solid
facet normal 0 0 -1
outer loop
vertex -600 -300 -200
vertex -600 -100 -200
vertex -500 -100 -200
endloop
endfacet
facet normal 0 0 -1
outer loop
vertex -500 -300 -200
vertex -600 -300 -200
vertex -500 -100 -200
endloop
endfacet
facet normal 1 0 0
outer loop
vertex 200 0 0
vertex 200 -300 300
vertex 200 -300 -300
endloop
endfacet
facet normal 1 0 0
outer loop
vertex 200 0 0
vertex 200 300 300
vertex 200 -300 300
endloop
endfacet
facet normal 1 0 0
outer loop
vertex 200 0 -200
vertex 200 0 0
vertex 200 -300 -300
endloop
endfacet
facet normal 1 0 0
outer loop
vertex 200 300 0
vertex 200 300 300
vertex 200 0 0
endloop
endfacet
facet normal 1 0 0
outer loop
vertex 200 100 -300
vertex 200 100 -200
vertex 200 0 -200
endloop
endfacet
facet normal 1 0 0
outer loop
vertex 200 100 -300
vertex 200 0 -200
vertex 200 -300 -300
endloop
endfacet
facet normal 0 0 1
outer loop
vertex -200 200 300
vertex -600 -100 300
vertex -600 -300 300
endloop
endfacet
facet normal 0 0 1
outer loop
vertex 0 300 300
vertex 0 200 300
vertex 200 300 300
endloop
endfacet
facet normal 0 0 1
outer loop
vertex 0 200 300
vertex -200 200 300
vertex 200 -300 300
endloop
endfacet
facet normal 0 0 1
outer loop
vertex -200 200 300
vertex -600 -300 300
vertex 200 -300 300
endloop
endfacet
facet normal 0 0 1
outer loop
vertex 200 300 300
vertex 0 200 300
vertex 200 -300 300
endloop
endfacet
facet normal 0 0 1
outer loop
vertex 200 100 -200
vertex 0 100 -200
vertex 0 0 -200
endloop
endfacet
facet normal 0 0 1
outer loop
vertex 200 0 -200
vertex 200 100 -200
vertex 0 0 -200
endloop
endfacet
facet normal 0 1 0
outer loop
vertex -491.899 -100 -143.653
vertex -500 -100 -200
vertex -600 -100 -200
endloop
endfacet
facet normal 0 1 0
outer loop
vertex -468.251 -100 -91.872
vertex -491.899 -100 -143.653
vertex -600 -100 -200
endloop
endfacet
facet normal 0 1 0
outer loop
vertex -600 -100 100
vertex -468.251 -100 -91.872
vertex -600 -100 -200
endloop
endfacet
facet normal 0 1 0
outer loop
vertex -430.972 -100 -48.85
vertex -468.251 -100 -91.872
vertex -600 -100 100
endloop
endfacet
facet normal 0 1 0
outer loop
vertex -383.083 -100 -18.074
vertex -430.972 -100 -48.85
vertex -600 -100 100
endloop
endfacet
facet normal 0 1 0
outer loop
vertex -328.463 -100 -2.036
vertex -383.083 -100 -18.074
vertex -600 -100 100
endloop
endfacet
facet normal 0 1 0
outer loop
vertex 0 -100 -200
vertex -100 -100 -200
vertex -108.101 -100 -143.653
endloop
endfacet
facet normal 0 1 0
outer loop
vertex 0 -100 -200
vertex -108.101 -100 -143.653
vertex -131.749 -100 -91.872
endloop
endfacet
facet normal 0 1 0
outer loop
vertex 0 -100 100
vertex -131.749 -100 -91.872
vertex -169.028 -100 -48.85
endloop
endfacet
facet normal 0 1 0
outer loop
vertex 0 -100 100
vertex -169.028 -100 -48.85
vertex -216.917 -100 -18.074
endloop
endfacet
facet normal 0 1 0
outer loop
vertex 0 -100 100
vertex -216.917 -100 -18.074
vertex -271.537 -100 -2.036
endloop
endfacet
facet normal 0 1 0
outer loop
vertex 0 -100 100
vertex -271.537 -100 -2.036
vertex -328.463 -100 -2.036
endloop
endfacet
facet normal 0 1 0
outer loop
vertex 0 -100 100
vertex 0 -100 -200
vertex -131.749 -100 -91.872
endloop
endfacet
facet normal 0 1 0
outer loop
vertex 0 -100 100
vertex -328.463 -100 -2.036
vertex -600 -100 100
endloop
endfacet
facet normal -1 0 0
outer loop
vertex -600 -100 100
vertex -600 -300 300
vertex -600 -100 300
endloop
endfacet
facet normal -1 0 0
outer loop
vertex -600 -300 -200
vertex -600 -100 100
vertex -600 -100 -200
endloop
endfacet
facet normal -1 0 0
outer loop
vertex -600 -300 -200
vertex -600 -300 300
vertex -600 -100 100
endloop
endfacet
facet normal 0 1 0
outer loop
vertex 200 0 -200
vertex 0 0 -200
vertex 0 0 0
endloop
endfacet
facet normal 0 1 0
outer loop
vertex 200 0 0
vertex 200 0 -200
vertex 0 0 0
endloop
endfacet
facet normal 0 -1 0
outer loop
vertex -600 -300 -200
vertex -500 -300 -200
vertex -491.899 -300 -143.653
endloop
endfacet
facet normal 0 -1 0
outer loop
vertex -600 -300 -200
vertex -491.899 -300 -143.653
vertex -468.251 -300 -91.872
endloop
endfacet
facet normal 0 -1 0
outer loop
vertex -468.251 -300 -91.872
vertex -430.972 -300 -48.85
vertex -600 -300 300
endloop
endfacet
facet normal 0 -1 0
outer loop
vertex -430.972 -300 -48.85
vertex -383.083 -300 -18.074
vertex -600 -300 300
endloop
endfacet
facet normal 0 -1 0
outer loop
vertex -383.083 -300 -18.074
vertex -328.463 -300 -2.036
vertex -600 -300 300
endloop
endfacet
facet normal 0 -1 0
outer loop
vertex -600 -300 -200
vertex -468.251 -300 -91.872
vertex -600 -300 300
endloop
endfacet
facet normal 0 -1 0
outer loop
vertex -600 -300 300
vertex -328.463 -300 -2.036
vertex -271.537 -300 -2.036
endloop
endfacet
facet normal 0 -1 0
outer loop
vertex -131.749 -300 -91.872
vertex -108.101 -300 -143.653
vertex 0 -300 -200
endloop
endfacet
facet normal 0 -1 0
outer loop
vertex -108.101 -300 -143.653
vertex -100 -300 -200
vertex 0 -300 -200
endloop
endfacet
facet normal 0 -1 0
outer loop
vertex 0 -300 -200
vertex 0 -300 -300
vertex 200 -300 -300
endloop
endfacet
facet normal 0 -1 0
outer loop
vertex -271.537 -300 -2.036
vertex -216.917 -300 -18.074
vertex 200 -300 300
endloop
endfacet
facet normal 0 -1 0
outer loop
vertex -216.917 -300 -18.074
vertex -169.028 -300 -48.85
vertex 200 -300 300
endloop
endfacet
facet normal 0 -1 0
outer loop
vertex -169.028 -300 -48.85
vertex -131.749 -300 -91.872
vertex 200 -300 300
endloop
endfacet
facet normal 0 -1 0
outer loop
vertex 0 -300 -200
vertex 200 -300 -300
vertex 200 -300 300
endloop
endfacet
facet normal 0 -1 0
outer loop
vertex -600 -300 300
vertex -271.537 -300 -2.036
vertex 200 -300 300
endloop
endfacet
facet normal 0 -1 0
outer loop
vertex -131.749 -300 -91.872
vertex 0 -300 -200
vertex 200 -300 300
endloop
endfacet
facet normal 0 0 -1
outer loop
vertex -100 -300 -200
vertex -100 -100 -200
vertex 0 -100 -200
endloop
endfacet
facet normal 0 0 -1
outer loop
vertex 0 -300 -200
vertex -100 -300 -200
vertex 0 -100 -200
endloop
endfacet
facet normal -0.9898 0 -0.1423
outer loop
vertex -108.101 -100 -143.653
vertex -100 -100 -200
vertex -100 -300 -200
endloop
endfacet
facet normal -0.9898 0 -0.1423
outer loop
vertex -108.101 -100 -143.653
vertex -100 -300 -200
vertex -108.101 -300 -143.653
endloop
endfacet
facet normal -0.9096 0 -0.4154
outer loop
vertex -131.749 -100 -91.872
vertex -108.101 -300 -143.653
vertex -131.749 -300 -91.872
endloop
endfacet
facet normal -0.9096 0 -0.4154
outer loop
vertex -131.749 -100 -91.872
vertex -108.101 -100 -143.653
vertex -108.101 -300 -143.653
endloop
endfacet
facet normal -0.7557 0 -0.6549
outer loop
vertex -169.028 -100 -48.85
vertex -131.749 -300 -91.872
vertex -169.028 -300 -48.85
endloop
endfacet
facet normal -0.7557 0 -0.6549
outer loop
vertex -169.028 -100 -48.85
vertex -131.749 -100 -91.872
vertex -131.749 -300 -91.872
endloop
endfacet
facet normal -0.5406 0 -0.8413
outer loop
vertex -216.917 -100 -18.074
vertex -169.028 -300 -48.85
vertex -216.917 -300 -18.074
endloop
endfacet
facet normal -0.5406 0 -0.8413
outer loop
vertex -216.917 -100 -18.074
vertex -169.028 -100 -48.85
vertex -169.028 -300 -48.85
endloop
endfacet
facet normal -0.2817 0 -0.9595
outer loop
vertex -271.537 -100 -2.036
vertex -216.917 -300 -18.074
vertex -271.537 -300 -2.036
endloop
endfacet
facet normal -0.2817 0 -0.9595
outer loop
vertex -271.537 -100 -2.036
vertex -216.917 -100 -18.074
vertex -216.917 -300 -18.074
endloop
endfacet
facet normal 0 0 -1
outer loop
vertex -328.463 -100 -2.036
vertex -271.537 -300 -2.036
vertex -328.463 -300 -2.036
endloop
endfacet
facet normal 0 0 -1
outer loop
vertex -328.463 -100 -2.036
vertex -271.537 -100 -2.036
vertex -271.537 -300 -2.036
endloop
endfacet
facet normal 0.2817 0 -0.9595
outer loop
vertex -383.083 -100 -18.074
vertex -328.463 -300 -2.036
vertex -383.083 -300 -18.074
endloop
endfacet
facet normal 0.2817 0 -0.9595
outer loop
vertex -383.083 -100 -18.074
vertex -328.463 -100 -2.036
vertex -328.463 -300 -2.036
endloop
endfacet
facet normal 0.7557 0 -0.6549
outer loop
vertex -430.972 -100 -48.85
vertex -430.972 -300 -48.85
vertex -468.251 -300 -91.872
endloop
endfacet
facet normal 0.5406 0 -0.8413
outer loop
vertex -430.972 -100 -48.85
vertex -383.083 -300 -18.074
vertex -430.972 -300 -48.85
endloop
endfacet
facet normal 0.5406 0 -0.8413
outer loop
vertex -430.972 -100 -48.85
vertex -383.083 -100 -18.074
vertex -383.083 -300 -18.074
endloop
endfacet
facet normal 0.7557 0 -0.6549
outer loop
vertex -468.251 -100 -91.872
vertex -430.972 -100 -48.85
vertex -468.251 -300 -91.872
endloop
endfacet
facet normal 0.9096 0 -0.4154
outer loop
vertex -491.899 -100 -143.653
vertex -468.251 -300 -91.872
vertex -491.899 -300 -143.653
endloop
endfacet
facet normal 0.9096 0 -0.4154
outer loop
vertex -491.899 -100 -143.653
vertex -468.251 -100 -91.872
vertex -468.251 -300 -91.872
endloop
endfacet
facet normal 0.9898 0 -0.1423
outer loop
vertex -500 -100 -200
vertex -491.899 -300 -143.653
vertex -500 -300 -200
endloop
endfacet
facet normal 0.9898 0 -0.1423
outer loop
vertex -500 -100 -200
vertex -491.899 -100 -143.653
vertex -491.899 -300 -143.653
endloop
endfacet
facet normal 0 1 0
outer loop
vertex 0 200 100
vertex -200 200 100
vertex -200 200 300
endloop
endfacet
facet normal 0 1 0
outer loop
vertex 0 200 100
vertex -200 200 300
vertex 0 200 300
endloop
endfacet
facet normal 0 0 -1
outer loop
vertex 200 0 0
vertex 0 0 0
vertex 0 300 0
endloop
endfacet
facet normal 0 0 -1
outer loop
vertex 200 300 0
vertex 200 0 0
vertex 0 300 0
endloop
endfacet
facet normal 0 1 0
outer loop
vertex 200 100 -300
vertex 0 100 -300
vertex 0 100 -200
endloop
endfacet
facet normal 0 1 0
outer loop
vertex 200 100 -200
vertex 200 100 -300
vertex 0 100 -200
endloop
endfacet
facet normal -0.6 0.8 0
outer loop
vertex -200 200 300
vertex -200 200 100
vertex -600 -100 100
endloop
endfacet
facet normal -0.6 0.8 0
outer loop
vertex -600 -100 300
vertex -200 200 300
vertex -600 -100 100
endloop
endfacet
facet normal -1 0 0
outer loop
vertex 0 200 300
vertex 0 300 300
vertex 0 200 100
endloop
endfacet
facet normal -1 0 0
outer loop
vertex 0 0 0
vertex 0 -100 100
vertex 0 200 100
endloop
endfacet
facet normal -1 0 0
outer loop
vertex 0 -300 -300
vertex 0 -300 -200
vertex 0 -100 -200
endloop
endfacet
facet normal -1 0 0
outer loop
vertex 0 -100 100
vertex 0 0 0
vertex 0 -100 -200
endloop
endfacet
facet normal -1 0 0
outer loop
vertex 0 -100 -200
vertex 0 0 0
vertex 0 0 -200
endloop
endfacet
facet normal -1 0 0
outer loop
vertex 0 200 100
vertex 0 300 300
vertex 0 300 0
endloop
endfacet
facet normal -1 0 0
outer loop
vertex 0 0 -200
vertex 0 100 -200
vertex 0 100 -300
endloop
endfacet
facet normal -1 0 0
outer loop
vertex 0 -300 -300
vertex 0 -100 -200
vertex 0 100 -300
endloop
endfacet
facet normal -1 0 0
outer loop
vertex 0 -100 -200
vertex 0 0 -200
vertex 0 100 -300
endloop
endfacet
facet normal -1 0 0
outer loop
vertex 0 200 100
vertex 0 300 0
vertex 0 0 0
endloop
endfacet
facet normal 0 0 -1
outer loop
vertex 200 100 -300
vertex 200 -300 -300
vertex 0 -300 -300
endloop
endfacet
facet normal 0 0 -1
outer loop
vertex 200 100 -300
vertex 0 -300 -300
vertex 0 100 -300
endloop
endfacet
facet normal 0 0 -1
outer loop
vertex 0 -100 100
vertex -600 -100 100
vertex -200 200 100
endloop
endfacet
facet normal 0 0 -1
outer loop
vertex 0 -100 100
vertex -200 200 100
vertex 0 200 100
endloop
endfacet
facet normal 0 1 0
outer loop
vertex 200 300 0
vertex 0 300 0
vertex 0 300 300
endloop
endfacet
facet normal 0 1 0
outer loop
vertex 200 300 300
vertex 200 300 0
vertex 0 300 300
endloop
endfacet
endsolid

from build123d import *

# Parameters (mm, degrees)
SALIENTE_EXTRUIR1_DEPTH = 200
CROQUIS3_W              = 600
CROQUIS3_H              = 200
SALIENTE_EXTRUIR2_DEPTH = 600
CORTAR_EXTRUIR1_REACH   = 783.025
CROQUIS4_W              = 600
CROQUIS4_H              = 100
CORTAR_EXTRUIR2_REACH   = 783.025
CROQUIS6_W              = 600
CROQUIS6_H              = 200
SALIENTE_EXTRUIR3_DEPTH = 300
CORTAR_EXTRUIR3_DEPTH   = 200


with BuildPart() as part:
    # Croquis2 → Saliente-Extruir1 (new body)
    with BuildSketch(Plane(origin=(0, 0, 0), x_dir=(0, 0, -1), z_dir=(1, 0, 0))):
        Polygon((-300, -300), (300, -300), (300, 0), (300, 100), (200, 100), (200, 0), (0, 0), (0, 300), (-300, 300), align=None)
    extrude(amount=SALIENTE_EXTRUIR1_DEPTH)

    # Croquis3 → Saliente-Extruir2 (add)
    with BuildSketch(Plane.ZY):
        with Locations((0, -200)):
            Rectangle(CROQUIS3_W, CROQUIS3_H)
    extrude(amount=SALIENTE_EXTRUIR2_DEPTH)

    # Croquis4 → Cortar-Extruir1 (cut, up to next)
    with BuildSketch(Plane(origin=(0, -100, 0), x_dir=(1, 0, 0), z_dir=(0, 1, 0)), mode=Mode.PRIVATE) as cortar_extruir1_sk1:
        with Locations((-300, 250)):
            Rectangle(CROQUIS4_W, CROQUIS4_H)
    cortar_extruir1_tool1 = extrude(cortar_extruir1_sk1.sketch, amount=-CORTAR_EXTRUIR1_REACH, mode=Mode.PRIVATE) & part.part
    add(cortar_extruir1_tool1.solids().sort_by_distance((-300, -100, -250))[0], mode=Mode.SUBTRACT)

    # Croquis5 → Cortar-Extruir2 (cut, up to next)
    with BuildSketch(Plane(origin=(0, -100, 0), x_dir=(1, 0, 0), z_dir=(0, 1, 0)), mode=Mode.PRIVATE) as cortar_extruir2_sk1:
        with BuildLine():
            Line((-500, 200), (-100, 200))
            ThreePointArc((-100, 200), (-300, 0), (-500, 200))
        make_face()
    cortar_extruir2_tool1 = extrude(cortar_extruir2_sk1.sketch, amount=-CORTAR_EXTRUIR2_REACH, mode=Mode.PRIVATE) & part.part
    add(cortar_extruir2_tool1.solids().sort_by_distance((-300, -100, -115.117364))[0], mode=Mode.SUBTRACT)

    # Croquis6 → Saliente-Extruir3 (add)
    with BuildSketch(Plane(origin=(0, -100, 0), x_dir=(1, 0, 0), z_dir=(0, 1, 0))):
        with Locations((-300, -200)):
            Rectangle(CROQUIS6_W, CROQUIS6_H)
    extrude(amount=SALIENTE_EXTRUIR3_DEPTH)

    # Croquis7 → Cortar-Extruir3 (cut)
    with BuildSketch(Plane(origin=(0, 0, 100), x_dir=(-1, 0, 0), z_dir=(0, 0, -1))):
        Polygon((200, 200), (600, -100), (600, 200), align=None)
    extrude(amount=-CORTAR_EXTRUIR3_DEPTH, mode=Mode.SUBTRACT)


solid = part.part
